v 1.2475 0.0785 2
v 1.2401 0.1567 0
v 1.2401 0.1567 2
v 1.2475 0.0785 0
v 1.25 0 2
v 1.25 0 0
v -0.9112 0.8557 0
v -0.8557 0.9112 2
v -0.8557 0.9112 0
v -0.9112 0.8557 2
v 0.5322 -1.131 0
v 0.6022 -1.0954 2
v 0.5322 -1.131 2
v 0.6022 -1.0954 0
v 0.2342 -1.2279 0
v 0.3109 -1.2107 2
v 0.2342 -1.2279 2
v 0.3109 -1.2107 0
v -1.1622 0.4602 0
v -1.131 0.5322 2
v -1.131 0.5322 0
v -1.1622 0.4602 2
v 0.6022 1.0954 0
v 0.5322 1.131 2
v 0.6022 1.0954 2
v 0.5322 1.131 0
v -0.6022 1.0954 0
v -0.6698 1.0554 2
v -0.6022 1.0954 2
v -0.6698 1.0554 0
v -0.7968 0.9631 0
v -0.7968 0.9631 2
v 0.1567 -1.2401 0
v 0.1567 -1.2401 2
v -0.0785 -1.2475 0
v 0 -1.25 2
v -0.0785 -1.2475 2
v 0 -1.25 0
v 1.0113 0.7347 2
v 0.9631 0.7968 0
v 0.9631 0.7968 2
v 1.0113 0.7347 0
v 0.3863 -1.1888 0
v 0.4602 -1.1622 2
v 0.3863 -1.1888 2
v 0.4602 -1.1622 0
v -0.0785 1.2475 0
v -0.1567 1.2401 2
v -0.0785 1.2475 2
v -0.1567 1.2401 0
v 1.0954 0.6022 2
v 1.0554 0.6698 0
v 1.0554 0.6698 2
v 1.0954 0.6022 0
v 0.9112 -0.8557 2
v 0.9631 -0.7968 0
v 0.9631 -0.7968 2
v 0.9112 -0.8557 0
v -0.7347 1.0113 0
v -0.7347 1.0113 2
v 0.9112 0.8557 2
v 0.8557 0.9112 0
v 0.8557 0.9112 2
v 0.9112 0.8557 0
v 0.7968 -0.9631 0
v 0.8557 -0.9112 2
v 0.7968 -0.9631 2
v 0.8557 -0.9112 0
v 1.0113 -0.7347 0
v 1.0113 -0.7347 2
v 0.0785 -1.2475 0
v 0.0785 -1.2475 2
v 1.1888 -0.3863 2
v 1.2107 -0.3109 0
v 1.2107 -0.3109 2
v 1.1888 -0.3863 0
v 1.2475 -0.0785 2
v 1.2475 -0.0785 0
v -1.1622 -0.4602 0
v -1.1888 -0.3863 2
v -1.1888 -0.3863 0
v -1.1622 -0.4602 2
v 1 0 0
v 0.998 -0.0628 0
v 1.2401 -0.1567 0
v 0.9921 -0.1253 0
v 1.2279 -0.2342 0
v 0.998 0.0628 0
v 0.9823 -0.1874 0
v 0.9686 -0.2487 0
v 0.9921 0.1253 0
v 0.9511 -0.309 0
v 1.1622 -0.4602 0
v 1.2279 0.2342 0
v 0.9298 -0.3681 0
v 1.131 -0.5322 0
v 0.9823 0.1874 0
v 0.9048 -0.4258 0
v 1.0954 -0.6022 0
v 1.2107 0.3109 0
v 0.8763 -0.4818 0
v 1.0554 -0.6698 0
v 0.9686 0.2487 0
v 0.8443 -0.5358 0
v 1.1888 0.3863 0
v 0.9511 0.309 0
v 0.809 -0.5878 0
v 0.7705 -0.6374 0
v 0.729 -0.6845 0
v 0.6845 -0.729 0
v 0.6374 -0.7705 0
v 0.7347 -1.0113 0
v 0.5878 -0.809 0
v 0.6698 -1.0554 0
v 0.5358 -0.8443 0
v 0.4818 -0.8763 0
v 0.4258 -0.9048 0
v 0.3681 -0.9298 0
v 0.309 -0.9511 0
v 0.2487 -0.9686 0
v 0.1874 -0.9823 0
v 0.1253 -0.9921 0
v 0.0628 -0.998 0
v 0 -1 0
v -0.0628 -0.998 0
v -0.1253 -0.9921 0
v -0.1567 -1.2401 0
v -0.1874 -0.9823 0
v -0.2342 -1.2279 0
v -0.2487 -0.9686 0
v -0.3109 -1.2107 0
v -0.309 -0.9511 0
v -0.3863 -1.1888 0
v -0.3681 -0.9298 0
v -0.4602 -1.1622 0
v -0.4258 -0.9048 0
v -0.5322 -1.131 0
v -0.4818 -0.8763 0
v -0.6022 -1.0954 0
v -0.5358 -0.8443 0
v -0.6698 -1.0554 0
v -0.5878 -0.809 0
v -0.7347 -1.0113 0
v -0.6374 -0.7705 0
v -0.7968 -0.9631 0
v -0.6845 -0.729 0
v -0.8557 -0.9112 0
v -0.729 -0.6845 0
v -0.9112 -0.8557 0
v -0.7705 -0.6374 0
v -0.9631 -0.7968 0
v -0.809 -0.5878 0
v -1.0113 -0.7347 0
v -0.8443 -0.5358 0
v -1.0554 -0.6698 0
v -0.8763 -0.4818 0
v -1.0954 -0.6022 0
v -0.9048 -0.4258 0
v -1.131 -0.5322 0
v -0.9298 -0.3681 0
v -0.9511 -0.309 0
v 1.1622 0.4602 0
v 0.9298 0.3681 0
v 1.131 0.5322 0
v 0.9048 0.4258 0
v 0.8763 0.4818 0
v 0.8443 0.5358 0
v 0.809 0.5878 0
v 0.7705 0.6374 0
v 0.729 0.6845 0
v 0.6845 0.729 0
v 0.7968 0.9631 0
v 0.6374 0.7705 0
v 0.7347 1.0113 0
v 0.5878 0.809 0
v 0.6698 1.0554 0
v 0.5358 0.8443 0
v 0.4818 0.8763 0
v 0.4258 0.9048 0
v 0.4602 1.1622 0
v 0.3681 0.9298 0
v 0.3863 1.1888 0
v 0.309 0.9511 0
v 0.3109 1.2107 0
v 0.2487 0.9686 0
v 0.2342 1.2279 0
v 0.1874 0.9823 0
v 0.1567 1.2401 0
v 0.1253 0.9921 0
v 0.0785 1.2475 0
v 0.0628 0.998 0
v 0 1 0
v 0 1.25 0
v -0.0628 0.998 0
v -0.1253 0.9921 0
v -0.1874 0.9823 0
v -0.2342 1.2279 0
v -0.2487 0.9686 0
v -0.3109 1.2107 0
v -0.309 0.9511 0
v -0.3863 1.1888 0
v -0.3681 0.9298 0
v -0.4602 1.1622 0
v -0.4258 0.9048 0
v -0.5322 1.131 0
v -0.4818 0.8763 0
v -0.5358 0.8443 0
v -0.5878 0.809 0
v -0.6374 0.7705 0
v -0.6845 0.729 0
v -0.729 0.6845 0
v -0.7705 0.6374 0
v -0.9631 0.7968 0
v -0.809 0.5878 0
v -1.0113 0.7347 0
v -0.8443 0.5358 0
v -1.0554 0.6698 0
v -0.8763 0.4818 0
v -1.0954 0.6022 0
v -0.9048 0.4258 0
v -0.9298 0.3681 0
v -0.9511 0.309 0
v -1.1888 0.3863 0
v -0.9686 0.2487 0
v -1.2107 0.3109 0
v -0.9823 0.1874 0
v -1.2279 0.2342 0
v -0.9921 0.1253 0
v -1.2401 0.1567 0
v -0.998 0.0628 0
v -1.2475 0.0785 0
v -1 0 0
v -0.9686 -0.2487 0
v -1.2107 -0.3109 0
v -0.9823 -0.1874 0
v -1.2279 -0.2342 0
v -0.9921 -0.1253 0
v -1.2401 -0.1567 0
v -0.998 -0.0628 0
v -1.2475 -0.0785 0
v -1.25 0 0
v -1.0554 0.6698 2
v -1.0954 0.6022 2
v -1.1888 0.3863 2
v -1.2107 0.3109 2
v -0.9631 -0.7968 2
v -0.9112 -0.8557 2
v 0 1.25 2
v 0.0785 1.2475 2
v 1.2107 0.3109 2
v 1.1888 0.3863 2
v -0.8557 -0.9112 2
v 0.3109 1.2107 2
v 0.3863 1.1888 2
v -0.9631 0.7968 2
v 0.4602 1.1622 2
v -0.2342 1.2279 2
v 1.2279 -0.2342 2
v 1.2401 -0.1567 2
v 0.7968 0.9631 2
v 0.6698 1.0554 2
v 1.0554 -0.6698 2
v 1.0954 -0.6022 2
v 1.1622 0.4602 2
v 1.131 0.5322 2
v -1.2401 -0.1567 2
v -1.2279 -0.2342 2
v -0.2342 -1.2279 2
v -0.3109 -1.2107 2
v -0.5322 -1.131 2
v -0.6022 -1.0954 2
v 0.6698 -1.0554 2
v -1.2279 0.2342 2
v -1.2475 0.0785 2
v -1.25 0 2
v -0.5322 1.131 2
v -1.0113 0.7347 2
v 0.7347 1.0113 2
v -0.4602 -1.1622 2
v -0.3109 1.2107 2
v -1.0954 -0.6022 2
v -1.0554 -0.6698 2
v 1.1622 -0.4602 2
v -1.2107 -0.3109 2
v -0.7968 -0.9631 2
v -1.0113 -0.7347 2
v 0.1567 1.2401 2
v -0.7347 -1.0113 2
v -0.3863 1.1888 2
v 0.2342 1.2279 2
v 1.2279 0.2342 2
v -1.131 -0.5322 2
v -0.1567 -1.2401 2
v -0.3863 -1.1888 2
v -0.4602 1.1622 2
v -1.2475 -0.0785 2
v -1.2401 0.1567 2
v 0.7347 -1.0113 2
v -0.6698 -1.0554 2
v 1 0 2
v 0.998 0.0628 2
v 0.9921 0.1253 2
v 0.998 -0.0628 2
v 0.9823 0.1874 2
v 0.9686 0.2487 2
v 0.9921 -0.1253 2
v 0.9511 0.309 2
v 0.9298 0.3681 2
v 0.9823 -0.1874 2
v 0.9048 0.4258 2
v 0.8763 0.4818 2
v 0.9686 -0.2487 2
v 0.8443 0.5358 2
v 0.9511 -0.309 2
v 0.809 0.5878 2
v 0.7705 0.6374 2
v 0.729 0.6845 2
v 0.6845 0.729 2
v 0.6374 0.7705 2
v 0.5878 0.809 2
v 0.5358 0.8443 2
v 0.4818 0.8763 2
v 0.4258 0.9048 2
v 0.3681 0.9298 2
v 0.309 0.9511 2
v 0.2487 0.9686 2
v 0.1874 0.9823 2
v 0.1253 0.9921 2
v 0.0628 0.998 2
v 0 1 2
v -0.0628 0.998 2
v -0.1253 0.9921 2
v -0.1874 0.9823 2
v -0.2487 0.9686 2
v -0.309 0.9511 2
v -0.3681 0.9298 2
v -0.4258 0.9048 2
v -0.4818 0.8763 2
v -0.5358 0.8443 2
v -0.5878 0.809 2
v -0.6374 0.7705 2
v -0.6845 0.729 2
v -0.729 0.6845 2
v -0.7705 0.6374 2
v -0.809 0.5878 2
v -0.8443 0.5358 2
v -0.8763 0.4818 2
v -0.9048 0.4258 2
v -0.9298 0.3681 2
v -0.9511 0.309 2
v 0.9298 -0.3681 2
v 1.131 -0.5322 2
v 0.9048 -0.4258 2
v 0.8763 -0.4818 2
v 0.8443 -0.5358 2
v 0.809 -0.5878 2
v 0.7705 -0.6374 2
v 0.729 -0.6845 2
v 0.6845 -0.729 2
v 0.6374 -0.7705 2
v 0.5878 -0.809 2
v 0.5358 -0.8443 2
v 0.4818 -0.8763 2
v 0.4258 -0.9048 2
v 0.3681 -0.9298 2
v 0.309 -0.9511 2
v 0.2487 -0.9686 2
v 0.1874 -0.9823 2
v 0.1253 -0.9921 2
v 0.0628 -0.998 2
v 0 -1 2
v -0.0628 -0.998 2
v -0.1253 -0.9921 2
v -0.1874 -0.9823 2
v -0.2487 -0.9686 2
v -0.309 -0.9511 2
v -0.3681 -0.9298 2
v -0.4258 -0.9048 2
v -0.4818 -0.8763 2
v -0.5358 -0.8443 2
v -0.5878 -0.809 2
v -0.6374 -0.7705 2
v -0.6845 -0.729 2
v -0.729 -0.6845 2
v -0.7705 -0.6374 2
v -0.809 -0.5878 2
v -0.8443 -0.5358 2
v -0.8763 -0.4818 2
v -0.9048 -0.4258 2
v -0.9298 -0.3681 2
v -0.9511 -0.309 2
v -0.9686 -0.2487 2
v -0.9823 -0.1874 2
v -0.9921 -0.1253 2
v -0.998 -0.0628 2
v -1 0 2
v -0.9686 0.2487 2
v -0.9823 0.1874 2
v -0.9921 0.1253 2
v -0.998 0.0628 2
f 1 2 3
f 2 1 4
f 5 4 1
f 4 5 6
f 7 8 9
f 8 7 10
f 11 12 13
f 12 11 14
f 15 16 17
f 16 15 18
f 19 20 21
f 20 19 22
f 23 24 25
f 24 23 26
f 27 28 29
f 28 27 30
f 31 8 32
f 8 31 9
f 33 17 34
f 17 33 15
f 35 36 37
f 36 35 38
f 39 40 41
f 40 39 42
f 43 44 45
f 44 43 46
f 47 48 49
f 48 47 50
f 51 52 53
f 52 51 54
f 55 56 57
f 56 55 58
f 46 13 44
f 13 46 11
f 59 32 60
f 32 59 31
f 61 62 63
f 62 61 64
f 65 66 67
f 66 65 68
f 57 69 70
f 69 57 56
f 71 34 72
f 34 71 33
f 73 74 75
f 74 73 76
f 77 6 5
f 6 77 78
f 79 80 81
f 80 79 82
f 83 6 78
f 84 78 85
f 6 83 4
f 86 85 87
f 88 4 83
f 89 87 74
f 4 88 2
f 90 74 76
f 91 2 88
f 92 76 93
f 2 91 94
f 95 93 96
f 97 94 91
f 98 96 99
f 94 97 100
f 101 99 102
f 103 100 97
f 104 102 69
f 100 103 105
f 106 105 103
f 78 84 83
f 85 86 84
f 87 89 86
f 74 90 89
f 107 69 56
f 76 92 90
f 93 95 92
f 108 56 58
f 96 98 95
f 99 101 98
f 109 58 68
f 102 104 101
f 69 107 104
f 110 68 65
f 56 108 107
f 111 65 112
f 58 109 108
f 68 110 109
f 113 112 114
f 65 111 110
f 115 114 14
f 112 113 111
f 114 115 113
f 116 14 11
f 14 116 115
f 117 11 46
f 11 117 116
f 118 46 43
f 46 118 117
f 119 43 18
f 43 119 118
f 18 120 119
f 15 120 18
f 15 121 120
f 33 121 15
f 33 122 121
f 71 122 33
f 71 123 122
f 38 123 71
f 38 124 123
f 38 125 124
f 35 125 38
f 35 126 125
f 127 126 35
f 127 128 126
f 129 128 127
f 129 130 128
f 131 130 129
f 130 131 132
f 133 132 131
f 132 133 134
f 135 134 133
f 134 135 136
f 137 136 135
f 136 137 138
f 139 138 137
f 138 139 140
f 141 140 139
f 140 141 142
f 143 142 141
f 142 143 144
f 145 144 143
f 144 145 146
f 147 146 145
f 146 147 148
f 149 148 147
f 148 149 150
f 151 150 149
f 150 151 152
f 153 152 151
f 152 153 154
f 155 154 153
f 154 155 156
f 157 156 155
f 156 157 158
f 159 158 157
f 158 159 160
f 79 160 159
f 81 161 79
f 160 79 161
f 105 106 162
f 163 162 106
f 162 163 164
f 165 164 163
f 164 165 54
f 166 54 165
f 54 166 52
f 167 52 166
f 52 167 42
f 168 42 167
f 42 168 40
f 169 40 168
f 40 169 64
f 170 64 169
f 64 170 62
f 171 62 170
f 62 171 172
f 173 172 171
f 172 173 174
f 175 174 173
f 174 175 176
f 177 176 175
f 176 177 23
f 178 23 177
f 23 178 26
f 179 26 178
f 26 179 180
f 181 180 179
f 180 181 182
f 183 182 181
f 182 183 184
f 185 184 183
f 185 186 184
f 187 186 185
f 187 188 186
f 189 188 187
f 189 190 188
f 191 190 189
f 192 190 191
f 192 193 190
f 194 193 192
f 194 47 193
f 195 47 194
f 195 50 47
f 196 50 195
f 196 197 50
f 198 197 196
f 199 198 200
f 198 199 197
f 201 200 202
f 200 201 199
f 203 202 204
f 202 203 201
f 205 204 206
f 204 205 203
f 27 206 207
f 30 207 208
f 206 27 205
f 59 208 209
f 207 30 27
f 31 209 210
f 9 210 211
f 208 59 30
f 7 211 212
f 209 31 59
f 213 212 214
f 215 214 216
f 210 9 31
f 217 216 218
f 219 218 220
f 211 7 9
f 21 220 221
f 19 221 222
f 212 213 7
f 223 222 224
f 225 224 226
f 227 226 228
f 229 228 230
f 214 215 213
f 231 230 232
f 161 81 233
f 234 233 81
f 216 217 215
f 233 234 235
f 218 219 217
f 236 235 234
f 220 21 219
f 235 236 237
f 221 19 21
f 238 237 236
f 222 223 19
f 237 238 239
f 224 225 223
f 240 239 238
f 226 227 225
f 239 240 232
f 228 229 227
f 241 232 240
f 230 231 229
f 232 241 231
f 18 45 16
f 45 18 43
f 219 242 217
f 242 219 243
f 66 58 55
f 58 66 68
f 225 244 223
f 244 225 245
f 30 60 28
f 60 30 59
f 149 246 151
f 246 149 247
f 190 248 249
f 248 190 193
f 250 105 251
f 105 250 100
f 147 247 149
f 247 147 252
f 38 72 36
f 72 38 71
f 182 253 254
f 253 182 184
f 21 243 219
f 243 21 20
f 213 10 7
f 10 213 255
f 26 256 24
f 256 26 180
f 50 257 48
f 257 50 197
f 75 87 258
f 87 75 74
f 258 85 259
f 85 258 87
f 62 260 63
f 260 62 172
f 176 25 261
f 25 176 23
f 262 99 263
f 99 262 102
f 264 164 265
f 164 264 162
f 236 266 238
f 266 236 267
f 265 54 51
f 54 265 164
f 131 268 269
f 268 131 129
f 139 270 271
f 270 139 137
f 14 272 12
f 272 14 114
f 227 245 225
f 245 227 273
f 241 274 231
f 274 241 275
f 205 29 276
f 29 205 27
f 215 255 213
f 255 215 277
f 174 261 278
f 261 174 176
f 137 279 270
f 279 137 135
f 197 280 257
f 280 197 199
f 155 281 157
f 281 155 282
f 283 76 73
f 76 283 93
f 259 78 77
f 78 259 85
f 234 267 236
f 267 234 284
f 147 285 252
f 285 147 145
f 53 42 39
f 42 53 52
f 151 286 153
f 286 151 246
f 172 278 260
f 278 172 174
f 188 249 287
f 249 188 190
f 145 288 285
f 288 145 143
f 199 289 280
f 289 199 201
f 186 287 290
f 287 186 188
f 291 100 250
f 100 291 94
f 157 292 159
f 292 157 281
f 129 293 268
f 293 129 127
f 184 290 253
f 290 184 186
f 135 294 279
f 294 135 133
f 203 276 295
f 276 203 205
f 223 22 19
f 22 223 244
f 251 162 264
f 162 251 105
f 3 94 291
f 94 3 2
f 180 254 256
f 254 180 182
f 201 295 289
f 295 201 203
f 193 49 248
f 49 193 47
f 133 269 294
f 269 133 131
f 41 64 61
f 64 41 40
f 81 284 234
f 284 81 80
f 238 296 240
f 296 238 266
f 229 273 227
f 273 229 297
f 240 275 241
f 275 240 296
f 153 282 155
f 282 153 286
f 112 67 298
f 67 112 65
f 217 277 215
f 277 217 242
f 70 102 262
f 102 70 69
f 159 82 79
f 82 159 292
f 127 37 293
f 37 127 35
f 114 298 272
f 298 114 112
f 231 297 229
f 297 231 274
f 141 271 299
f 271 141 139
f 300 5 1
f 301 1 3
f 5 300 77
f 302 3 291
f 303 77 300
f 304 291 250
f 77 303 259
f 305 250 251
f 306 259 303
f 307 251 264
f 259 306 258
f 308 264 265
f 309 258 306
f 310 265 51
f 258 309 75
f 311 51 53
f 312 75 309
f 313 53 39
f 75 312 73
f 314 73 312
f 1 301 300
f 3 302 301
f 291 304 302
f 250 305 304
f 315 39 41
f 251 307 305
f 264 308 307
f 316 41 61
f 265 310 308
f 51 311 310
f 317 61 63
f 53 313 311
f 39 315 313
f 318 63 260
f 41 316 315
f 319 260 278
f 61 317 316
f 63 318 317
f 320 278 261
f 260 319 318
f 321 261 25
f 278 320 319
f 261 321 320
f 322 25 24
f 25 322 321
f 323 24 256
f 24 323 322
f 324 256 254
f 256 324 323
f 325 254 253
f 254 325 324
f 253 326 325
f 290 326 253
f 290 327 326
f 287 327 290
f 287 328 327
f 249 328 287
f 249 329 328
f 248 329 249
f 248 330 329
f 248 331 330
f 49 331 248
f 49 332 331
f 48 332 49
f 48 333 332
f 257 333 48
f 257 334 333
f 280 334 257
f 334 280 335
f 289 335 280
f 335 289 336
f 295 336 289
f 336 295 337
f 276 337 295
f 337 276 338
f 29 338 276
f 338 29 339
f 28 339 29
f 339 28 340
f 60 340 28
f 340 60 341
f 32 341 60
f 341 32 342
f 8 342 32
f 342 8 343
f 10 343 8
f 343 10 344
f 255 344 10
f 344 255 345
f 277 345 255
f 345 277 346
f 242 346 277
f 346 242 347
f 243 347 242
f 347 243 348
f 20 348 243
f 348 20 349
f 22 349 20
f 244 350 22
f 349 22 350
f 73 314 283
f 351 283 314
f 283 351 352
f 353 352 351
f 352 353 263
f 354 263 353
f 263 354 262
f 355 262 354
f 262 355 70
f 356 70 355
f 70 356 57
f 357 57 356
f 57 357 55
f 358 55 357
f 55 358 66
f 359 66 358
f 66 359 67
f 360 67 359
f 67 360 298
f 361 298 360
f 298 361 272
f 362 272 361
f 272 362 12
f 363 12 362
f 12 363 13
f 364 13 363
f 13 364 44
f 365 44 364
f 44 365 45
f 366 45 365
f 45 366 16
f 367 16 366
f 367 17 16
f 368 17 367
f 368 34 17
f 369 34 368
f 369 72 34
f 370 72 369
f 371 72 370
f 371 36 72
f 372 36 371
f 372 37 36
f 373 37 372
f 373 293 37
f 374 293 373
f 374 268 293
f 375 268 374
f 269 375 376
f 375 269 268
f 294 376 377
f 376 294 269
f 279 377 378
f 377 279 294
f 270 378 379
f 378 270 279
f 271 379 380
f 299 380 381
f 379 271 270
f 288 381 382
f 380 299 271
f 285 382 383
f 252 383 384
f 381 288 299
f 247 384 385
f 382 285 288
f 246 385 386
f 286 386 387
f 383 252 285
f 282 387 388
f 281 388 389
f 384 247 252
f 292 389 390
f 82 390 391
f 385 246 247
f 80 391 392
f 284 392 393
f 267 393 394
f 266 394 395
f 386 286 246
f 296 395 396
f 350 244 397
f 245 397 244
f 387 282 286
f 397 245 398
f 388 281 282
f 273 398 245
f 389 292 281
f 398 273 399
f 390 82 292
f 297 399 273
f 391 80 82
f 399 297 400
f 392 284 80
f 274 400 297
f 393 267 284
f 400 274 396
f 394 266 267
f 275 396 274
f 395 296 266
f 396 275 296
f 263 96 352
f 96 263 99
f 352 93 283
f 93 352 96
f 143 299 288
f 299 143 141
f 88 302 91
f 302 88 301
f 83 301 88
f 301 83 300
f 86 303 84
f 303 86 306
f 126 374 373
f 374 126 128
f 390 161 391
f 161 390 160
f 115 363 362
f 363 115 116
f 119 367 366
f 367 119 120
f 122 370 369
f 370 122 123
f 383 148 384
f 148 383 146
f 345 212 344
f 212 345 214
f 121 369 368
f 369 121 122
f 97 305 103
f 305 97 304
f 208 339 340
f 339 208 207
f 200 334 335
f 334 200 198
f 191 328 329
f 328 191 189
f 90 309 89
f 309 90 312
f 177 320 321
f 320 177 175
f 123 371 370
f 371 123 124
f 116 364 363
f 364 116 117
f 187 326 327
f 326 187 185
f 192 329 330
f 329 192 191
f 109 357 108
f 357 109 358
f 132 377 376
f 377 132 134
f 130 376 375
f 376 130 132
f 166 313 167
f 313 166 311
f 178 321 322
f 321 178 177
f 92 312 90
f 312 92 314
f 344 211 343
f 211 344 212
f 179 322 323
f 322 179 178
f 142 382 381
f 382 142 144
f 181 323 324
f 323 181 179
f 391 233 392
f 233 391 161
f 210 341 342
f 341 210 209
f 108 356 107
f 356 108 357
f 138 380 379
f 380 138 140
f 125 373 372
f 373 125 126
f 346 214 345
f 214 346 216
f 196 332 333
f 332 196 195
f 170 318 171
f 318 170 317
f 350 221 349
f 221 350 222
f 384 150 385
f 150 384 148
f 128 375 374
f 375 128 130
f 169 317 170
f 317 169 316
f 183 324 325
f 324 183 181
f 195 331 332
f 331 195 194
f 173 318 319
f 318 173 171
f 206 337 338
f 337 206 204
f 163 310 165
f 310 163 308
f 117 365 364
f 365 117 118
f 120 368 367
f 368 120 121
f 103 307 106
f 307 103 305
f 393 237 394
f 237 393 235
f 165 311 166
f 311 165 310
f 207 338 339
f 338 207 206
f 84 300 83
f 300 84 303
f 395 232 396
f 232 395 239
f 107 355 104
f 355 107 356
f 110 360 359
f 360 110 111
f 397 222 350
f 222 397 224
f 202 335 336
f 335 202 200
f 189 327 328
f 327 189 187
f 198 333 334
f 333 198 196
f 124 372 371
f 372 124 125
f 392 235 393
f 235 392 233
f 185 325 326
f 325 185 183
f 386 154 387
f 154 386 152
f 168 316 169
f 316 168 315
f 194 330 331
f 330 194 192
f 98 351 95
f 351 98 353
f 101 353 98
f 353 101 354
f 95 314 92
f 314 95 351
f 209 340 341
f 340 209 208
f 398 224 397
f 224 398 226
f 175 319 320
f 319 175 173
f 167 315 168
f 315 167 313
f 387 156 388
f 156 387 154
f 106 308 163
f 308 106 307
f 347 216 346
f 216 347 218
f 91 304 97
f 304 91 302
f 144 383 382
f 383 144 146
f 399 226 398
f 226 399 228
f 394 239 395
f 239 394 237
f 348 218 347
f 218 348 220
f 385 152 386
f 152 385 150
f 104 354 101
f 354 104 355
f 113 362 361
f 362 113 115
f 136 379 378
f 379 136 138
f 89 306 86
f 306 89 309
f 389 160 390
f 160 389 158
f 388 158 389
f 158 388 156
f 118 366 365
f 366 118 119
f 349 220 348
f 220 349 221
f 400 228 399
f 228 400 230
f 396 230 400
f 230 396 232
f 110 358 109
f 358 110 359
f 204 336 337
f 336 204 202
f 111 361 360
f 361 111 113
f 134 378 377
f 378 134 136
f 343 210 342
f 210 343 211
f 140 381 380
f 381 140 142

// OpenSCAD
//################################################################
// paper tube.scad - creates simple hollow cylinder
// (c) 2021 - Roie R. Black
// docs: https://rblack.github.io/math-magik/magik/paper_tube.html

$fn = 100;

module paper_tube(r=1, h=2, t=0.25) {
  th = 3 * h;
  difference() {
    cylinder(r=r+t,h=h);
    translate([0,0,-h])
      cylinder(r=r, h=th);
  }
}

paper_tube();
